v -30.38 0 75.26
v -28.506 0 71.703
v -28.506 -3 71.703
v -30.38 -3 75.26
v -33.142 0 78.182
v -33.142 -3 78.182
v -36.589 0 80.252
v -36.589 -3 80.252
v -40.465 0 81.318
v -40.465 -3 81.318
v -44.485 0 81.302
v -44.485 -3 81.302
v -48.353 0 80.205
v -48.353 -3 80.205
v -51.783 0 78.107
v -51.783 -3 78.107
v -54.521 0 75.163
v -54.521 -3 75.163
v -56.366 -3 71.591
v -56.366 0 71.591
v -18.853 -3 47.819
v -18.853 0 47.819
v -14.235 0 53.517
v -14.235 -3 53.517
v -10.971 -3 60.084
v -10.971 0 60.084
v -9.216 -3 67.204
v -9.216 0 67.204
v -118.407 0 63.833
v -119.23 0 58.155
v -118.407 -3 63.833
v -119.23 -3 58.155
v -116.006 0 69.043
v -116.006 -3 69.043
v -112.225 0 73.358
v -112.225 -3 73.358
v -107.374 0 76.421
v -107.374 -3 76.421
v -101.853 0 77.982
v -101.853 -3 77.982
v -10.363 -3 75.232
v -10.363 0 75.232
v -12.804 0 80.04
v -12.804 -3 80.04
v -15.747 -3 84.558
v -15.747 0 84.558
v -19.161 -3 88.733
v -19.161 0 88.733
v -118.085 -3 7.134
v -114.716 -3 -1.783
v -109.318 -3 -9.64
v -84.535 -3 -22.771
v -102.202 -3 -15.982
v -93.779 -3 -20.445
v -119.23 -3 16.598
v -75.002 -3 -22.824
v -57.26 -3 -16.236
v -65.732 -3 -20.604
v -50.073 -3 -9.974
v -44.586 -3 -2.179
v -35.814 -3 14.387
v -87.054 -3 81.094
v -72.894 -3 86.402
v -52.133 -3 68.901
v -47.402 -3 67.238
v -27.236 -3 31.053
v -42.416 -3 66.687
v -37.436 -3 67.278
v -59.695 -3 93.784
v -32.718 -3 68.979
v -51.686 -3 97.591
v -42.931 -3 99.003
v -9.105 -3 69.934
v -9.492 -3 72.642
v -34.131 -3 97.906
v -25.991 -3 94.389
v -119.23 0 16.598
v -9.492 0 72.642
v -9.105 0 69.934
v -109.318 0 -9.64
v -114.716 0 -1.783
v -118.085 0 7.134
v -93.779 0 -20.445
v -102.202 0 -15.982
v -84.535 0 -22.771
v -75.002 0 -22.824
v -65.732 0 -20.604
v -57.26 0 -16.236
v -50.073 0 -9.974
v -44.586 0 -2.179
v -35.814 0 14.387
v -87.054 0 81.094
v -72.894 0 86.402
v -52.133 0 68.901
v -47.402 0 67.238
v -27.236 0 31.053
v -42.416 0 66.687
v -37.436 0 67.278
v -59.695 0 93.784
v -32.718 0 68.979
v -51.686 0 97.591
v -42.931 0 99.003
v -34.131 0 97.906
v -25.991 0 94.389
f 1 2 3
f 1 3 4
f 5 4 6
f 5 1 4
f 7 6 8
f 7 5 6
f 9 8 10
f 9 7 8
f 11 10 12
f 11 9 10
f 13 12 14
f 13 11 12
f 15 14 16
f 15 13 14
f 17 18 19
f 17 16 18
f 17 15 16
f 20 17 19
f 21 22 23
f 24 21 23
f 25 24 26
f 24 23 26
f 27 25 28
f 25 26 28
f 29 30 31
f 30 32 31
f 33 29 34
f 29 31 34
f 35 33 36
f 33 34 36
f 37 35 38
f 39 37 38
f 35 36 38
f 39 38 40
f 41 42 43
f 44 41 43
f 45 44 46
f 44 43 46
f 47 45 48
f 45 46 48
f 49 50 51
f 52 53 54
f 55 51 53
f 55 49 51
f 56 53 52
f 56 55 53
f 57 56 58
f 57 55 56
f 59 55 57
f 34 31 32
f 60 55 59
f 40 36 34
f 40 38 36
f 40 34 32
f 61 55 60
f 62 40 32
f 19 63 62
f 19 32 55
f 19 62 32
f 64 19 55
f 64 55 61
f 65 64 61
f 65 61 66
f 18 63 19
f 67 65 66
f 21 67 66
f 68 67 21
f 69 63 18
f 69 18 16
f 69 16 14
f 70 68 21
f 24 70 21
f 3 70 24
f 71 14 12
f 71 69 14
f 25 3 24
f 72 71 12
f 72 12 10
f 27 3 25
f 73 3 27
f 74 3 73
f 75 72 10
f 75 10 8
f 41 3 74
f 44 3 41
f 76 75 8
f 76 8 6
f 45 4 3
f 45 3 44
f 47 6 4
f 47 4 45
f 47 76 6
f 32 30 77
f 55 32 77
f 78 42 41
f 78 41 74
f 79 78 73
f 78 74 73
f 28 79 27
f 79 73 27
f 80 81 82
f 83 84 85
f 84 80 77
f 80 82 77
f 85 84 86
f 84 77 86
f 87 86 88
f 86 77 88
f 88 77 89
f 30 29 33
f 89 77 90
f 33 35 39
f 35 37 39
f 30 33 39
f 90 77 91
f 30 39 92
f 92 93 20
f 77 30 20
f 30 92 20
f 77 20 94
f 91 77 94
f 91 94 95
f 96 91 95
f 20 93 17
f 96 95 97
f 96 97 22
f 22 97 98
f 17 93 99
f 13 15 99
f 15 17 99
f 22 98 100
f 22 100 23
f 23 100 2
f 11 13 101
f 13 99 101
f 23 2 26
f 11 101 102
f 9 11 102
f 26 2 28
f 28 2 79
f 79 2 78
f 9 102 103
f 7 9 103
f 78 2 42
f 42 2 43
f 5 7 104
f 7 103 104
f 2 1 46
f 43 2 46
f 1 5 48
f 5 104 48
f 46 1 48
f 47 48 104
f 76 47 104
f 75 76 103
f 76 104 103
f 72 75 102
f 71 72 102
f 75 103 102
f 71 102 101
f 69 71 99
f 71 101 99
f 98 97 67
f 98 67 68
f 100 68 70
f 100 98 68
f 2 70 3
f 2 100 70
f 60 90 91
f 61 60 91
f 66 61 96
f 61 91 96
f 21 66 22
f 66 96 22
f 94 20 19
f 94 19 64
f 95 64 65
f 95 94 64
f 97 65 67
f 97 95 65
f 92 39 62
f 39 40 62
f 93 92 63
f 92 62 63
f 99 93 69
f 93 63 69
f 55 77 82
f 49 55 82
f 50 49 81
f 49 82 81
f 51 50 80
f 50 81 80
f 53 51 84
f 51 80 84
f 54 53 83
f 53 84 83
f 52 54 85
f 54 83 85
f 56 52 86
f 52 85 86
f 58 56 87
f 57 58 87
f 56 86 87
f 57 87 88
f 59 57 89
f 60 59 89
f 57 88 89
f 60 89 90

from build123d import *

# Parameters (mm, degrees)
F1_DEPTH = 3
F2_DEPTH = 25
F3_R     = 20
F4_R     = 100
F5_R     = 15


with BuildPart() as f1:
    # F0 (on Front) → F1 (new body)
    with BuildSketch(Plane.XZ):
        with BuildLine():
            ThreePointArc((-119.2295857728, 16.5976797057), (-89.2269882152, -21.8866064143), (-44.5863344816, -2.1785326218))
            ThreePointArc((-44.5863344816, -2.1785326218), (-31.5003837254, 22.7075657451), (-18.8527258188, 47.819251244))
            ThreePointArc((-18.8527258187, 47.819251244), (-11.5073907558, 58.7139707042), (-8.9261215756, 71.5975225717))
            Line((-8.9261215756, 71.5975225717), (-11.67442069, 71.5975225717))
            Line((-11.67442069, 71.5975225717), (-11.67442069, 74.0203762137))
            ThreePointArc((-11.67442069, 74.0203762137), (-14.431706638, 81.8781100982), (-19.1607128584, 88.7325325952))
            ThreePointArc((-19.1607128584, 88.7325325952), (-48.5320541227, 98.3962580043), (-71.9061774941, 78.1548738354))
            Line((-71.9061774941, 78.1548738354), (-107.2845857728, 78.1548738354))
            Line((-107.2845857728, 78.1548738354), (-119.2295857728, 78.1548738354))
            Line((-119.2295857728, 78.1548738354), (-119.2295857728, 66.2098738354))
            Line((-119.2295857728, 66.2098738354), (-119.2295857728, 16.5976797057))
        make_face()
        with BuildLine():
            ThreePointArc((-26.6928125913, 79.0930187933), (-24.6315082315, 75.5227380173), (-23.3711215756, 71.597523888))
            Line((-23.3711215756, 71.597523888), (-20.8711215756, 71.5975236602))
            ThreePointArc((-20.8711215756, 71.5975236602), (-22.8939959961, 62.4935676044), (-28.5819229469, 55.1029300277))
            ThreePointArc((-28.5819229469, 55.1029300277), (-41.6104278008, 29.1671780434), (-55.1096433175, 3.4732809051))
            ThreePointArc((-55.1096433175, 3.4732809051), (-86.3130475025, -10.3024804429), (-107.2845857728, 16.5976797057))
            Line((-107.2845857728, 16.5976797057), (-107.2845857728, 66.2098738354))
            Line((-107.2845857728, 66.2098738354), (-104.7845857728, 66.2098738354))
            Line((-104.7845857728, 66.2098738354), (-68.5864427672, 66.2098738354))
            Line((-68.5864427672, 66.2098738354), (-63.1803487139, 66.2098738354))
            ThreePointArc((-63.1803487139, 66.2098738354), (-63.6941147242, 68.8812286524), (-63.8664115811, 71.5960777945))
            Line((-63.8664115811, 71.5960777945), (-61.3664115868, 71.5962461646))
            ThreePointArc((-61.3664115868, 71.5962461646), (-46.4685424734, 86.625019162), (-26.6928125913, 79.0930187933))
        make_face(mode=Mode.SUBTRACT)
        with BuildLine():
            ThreePointArc((-32.7025071715, 52.3956462756), (-51.243606048, 52.0172813271), (-63.1803487139, 66.2098738354))
            Line((-63.1803487139, 66.2098738354), (-68.5864427672, 66.2098738354))
            Line((-68.5864427672, 66.2098738354), (-104.7845857728, 66.2098738354))
            Line((-104.7845857728, 66.2098738354), (-104.7845857728, 16.5976797057))
            ThreePointArc((-104.7845857728, 16.5976797057), (-85.7031813006, -7.8780087034), (-57.3120938901, 4.6561636023))
            ThreePointArc((-57.3120938901, 4.6561636023), (-44.8056231456, 28.4219407394), (-32.7025071715, 52.3956462756))
        make_face()
        with BuildLine():
            ThreePointArc((-61.3664115868, 71.5962461646), (-42.368127741, 52.5998806027), (-23.3711215756, 71.597523888))
            Line((-23.3711215756, 71.597523888), (-28.5062876117, 71.7030383349))
            ThreePointArc((-28.5062876117, 71.7030383349), (-35.0280474509, 67.9936357913), (-42.4162418185, 66.6868830916))
            ThreePointArc((-42.4162418185, 66.6868830916), (-49.8149115034, 67.9342855665), (-56.3664115867, 71.5913571683))
            Line((-56.3664115866, 71.5913571683), (-61.3664115868, 71.5962461646))
        make_face()
        with BuildLine():
            ThreePointArc((-55.1096433175, 3.4732809051), (-41.6104278008, 29.1671780434), (-28.5819229469, 55.1029300277))
            ThreePointArc((-28.5819229469, 55.1029300277), (-30.5643455059, 53.6307678626), (-32.7025071715, 52.3956462756))
            ThreePointArc((-32.7025071715, 52.3956462756), (-44.8056231456, 28.4219407394), (-57.3120938901, 4.6561636023))
            ThreePointArc((-57.3120938901, 4.6561636023), (-85.7031813006, -7.8780087034), (-104.7845857728, 16.5976797057))
            Line((-104.7845857728, 16.5976797057), (-104.7845857728, 66.2098738354))
            Line((-104.7845857728, 66.2098738354), (-107.2845857728, 66.2098738354))
            Line((-107.2845857728, 66.2098738354), (-107.2845857728, 16.5976797057))
            ThreePointArc((-107.2845857728, 16.5976797057), (-86.3130475025, -10.3024804429), (-55.1096433175, 3.4732809051))
        make_face()
        with BuildLine():
            ThreePointArc((-42.4162418185, 66.6868830916), (-35.0280474509, 67.9936357913), (-28.5062876117, 71.7030383349))
            ThreePointArc((-28.5062876117, 71.7030383349), (-42.4756351565, 81.447422187), (-56.3664115866, 71.5913571682))
            ThreePointArc((-56.3664115867, 71.5913571683), (-49.8149115034, 67.9342855665), (-42.4162418185, 66.6868830916))
        make_face()
        with BuildLine():
            Line((-28.5062876117, 71.7030383349), (-23.3711215756, 71.597523888))
            ThreePointArc((-23.3711215756, 71.597523888), (-24.6315082315, 75.5227380173), (-26.6928125913, 79.0930187933))
            ThreePointArc((-26.6928125913, 79.0930187933), (-46.4685424734, 86.625019162), (-61.3664115868, 71.5962461646))
            Line((-61.3664115868, 71.5962461646), (-56.3664115866, 71.5913571683))
            ThreePointArc((-56.3664115866, 71.5913571682), (-42.4756351565, 81.447422187), (-28.5062876117, 71.7030383349))
        make_face()
        with BuildLine():
            Line((-20.8711215756, 71.5975236602), (-23.3711215756, 71.597523888))
            ThreePointArc((-23.3711215756, 71.597523888), (-42.368127741, 52.5998806027), (-61.3664115868, 71.5962461646))
            Line((-61.3664115868, 71.5962461646), (-63.8664115811, 71.5960777945))
            ThreePointArc((-63.8664115811, 71.5960777945), (-63.6941147242, 68.8812286524), (-63.1803487139, 66.2098738354))
            ThreePointArc((-63.1803487139, 66.2098738354), (-51.243606048, 52.0172813271), (-32.7025071715, 52.3956462756))
            ThreePointArc((-32.7025071715, 52.3956462756), (-30.5643455059, 53.6307678626), (-28.5819229469, 55.1029300277))
            ThreePointArc((-28.5819229469, 55.1029300277), (-22.8939959961, 62.4935676044), (-20.8711215756, 71.5975236602))
        make_face()
        with BuildLine():
            Line((-11.67442069, 71.5975225717), (-8.9261215756, 71.5975225717))
            ThreePointArc((-8.9261215756, 71.5975225717), (-13.1797411051, 80.6808937541), (-19.1607128584, 88.7325325952))
            ThreePointArc((-19.1607128584, 88.7325325952), (-14.431706638, 81.8781100982), (-11.67442069, 74.0203762137))
            Line((-11.67442069, 74.0203762137), (-11.67442069, 71.5975225717))
        make_face()
    extrude(amount=F1_DEPTH)

    # F0 (on Front) → F2 (cut)
    with BuildSketch(Plane.XZ):
        with BuildLine():
            ThreePointArc((-42.4162418185, 66.6868830916), (-35.0280474509, 67.9936357913), (-28.5062876117, 71.7030383349))
            ThreePointArc((-28.5062876117, 71.7030383349), (-42.4756351565, 81.447422187), (-56.3664115866, 71.5913571682))
            ThreePointArc((-56.3664115867, 71.5913571683), (-49.8149115034, 67.9342855665), (-42.4162418185, 66.6868830916))
        make_face()
    extrude(amount=F2_DEPTH, mode=Mode.SUBTRACT)

    # F3
    f3_edges = [f1.edges().sort_by_distance(p)[0] for p in [
        (-119.229586, -1.5, 78.154874),
    ]]
    fillet(f3_edges, radius=F3_R)

    # F4
    f4_edges = [f1.edges().sort_by_distance(p)[0] for p in [
        (-71.906177, -1.5, 78.154874),
    ]]
    fillet(f4_edges, radius=F4_R)

    # F5
    f5_edges = [f1.edges().sort_by_distance(p)[0] for p in [
        (-8.926122, -1.5, 71.597523),
    ]]
    fillet(f5_edges, radius=F5_R)


solid = f1.part
